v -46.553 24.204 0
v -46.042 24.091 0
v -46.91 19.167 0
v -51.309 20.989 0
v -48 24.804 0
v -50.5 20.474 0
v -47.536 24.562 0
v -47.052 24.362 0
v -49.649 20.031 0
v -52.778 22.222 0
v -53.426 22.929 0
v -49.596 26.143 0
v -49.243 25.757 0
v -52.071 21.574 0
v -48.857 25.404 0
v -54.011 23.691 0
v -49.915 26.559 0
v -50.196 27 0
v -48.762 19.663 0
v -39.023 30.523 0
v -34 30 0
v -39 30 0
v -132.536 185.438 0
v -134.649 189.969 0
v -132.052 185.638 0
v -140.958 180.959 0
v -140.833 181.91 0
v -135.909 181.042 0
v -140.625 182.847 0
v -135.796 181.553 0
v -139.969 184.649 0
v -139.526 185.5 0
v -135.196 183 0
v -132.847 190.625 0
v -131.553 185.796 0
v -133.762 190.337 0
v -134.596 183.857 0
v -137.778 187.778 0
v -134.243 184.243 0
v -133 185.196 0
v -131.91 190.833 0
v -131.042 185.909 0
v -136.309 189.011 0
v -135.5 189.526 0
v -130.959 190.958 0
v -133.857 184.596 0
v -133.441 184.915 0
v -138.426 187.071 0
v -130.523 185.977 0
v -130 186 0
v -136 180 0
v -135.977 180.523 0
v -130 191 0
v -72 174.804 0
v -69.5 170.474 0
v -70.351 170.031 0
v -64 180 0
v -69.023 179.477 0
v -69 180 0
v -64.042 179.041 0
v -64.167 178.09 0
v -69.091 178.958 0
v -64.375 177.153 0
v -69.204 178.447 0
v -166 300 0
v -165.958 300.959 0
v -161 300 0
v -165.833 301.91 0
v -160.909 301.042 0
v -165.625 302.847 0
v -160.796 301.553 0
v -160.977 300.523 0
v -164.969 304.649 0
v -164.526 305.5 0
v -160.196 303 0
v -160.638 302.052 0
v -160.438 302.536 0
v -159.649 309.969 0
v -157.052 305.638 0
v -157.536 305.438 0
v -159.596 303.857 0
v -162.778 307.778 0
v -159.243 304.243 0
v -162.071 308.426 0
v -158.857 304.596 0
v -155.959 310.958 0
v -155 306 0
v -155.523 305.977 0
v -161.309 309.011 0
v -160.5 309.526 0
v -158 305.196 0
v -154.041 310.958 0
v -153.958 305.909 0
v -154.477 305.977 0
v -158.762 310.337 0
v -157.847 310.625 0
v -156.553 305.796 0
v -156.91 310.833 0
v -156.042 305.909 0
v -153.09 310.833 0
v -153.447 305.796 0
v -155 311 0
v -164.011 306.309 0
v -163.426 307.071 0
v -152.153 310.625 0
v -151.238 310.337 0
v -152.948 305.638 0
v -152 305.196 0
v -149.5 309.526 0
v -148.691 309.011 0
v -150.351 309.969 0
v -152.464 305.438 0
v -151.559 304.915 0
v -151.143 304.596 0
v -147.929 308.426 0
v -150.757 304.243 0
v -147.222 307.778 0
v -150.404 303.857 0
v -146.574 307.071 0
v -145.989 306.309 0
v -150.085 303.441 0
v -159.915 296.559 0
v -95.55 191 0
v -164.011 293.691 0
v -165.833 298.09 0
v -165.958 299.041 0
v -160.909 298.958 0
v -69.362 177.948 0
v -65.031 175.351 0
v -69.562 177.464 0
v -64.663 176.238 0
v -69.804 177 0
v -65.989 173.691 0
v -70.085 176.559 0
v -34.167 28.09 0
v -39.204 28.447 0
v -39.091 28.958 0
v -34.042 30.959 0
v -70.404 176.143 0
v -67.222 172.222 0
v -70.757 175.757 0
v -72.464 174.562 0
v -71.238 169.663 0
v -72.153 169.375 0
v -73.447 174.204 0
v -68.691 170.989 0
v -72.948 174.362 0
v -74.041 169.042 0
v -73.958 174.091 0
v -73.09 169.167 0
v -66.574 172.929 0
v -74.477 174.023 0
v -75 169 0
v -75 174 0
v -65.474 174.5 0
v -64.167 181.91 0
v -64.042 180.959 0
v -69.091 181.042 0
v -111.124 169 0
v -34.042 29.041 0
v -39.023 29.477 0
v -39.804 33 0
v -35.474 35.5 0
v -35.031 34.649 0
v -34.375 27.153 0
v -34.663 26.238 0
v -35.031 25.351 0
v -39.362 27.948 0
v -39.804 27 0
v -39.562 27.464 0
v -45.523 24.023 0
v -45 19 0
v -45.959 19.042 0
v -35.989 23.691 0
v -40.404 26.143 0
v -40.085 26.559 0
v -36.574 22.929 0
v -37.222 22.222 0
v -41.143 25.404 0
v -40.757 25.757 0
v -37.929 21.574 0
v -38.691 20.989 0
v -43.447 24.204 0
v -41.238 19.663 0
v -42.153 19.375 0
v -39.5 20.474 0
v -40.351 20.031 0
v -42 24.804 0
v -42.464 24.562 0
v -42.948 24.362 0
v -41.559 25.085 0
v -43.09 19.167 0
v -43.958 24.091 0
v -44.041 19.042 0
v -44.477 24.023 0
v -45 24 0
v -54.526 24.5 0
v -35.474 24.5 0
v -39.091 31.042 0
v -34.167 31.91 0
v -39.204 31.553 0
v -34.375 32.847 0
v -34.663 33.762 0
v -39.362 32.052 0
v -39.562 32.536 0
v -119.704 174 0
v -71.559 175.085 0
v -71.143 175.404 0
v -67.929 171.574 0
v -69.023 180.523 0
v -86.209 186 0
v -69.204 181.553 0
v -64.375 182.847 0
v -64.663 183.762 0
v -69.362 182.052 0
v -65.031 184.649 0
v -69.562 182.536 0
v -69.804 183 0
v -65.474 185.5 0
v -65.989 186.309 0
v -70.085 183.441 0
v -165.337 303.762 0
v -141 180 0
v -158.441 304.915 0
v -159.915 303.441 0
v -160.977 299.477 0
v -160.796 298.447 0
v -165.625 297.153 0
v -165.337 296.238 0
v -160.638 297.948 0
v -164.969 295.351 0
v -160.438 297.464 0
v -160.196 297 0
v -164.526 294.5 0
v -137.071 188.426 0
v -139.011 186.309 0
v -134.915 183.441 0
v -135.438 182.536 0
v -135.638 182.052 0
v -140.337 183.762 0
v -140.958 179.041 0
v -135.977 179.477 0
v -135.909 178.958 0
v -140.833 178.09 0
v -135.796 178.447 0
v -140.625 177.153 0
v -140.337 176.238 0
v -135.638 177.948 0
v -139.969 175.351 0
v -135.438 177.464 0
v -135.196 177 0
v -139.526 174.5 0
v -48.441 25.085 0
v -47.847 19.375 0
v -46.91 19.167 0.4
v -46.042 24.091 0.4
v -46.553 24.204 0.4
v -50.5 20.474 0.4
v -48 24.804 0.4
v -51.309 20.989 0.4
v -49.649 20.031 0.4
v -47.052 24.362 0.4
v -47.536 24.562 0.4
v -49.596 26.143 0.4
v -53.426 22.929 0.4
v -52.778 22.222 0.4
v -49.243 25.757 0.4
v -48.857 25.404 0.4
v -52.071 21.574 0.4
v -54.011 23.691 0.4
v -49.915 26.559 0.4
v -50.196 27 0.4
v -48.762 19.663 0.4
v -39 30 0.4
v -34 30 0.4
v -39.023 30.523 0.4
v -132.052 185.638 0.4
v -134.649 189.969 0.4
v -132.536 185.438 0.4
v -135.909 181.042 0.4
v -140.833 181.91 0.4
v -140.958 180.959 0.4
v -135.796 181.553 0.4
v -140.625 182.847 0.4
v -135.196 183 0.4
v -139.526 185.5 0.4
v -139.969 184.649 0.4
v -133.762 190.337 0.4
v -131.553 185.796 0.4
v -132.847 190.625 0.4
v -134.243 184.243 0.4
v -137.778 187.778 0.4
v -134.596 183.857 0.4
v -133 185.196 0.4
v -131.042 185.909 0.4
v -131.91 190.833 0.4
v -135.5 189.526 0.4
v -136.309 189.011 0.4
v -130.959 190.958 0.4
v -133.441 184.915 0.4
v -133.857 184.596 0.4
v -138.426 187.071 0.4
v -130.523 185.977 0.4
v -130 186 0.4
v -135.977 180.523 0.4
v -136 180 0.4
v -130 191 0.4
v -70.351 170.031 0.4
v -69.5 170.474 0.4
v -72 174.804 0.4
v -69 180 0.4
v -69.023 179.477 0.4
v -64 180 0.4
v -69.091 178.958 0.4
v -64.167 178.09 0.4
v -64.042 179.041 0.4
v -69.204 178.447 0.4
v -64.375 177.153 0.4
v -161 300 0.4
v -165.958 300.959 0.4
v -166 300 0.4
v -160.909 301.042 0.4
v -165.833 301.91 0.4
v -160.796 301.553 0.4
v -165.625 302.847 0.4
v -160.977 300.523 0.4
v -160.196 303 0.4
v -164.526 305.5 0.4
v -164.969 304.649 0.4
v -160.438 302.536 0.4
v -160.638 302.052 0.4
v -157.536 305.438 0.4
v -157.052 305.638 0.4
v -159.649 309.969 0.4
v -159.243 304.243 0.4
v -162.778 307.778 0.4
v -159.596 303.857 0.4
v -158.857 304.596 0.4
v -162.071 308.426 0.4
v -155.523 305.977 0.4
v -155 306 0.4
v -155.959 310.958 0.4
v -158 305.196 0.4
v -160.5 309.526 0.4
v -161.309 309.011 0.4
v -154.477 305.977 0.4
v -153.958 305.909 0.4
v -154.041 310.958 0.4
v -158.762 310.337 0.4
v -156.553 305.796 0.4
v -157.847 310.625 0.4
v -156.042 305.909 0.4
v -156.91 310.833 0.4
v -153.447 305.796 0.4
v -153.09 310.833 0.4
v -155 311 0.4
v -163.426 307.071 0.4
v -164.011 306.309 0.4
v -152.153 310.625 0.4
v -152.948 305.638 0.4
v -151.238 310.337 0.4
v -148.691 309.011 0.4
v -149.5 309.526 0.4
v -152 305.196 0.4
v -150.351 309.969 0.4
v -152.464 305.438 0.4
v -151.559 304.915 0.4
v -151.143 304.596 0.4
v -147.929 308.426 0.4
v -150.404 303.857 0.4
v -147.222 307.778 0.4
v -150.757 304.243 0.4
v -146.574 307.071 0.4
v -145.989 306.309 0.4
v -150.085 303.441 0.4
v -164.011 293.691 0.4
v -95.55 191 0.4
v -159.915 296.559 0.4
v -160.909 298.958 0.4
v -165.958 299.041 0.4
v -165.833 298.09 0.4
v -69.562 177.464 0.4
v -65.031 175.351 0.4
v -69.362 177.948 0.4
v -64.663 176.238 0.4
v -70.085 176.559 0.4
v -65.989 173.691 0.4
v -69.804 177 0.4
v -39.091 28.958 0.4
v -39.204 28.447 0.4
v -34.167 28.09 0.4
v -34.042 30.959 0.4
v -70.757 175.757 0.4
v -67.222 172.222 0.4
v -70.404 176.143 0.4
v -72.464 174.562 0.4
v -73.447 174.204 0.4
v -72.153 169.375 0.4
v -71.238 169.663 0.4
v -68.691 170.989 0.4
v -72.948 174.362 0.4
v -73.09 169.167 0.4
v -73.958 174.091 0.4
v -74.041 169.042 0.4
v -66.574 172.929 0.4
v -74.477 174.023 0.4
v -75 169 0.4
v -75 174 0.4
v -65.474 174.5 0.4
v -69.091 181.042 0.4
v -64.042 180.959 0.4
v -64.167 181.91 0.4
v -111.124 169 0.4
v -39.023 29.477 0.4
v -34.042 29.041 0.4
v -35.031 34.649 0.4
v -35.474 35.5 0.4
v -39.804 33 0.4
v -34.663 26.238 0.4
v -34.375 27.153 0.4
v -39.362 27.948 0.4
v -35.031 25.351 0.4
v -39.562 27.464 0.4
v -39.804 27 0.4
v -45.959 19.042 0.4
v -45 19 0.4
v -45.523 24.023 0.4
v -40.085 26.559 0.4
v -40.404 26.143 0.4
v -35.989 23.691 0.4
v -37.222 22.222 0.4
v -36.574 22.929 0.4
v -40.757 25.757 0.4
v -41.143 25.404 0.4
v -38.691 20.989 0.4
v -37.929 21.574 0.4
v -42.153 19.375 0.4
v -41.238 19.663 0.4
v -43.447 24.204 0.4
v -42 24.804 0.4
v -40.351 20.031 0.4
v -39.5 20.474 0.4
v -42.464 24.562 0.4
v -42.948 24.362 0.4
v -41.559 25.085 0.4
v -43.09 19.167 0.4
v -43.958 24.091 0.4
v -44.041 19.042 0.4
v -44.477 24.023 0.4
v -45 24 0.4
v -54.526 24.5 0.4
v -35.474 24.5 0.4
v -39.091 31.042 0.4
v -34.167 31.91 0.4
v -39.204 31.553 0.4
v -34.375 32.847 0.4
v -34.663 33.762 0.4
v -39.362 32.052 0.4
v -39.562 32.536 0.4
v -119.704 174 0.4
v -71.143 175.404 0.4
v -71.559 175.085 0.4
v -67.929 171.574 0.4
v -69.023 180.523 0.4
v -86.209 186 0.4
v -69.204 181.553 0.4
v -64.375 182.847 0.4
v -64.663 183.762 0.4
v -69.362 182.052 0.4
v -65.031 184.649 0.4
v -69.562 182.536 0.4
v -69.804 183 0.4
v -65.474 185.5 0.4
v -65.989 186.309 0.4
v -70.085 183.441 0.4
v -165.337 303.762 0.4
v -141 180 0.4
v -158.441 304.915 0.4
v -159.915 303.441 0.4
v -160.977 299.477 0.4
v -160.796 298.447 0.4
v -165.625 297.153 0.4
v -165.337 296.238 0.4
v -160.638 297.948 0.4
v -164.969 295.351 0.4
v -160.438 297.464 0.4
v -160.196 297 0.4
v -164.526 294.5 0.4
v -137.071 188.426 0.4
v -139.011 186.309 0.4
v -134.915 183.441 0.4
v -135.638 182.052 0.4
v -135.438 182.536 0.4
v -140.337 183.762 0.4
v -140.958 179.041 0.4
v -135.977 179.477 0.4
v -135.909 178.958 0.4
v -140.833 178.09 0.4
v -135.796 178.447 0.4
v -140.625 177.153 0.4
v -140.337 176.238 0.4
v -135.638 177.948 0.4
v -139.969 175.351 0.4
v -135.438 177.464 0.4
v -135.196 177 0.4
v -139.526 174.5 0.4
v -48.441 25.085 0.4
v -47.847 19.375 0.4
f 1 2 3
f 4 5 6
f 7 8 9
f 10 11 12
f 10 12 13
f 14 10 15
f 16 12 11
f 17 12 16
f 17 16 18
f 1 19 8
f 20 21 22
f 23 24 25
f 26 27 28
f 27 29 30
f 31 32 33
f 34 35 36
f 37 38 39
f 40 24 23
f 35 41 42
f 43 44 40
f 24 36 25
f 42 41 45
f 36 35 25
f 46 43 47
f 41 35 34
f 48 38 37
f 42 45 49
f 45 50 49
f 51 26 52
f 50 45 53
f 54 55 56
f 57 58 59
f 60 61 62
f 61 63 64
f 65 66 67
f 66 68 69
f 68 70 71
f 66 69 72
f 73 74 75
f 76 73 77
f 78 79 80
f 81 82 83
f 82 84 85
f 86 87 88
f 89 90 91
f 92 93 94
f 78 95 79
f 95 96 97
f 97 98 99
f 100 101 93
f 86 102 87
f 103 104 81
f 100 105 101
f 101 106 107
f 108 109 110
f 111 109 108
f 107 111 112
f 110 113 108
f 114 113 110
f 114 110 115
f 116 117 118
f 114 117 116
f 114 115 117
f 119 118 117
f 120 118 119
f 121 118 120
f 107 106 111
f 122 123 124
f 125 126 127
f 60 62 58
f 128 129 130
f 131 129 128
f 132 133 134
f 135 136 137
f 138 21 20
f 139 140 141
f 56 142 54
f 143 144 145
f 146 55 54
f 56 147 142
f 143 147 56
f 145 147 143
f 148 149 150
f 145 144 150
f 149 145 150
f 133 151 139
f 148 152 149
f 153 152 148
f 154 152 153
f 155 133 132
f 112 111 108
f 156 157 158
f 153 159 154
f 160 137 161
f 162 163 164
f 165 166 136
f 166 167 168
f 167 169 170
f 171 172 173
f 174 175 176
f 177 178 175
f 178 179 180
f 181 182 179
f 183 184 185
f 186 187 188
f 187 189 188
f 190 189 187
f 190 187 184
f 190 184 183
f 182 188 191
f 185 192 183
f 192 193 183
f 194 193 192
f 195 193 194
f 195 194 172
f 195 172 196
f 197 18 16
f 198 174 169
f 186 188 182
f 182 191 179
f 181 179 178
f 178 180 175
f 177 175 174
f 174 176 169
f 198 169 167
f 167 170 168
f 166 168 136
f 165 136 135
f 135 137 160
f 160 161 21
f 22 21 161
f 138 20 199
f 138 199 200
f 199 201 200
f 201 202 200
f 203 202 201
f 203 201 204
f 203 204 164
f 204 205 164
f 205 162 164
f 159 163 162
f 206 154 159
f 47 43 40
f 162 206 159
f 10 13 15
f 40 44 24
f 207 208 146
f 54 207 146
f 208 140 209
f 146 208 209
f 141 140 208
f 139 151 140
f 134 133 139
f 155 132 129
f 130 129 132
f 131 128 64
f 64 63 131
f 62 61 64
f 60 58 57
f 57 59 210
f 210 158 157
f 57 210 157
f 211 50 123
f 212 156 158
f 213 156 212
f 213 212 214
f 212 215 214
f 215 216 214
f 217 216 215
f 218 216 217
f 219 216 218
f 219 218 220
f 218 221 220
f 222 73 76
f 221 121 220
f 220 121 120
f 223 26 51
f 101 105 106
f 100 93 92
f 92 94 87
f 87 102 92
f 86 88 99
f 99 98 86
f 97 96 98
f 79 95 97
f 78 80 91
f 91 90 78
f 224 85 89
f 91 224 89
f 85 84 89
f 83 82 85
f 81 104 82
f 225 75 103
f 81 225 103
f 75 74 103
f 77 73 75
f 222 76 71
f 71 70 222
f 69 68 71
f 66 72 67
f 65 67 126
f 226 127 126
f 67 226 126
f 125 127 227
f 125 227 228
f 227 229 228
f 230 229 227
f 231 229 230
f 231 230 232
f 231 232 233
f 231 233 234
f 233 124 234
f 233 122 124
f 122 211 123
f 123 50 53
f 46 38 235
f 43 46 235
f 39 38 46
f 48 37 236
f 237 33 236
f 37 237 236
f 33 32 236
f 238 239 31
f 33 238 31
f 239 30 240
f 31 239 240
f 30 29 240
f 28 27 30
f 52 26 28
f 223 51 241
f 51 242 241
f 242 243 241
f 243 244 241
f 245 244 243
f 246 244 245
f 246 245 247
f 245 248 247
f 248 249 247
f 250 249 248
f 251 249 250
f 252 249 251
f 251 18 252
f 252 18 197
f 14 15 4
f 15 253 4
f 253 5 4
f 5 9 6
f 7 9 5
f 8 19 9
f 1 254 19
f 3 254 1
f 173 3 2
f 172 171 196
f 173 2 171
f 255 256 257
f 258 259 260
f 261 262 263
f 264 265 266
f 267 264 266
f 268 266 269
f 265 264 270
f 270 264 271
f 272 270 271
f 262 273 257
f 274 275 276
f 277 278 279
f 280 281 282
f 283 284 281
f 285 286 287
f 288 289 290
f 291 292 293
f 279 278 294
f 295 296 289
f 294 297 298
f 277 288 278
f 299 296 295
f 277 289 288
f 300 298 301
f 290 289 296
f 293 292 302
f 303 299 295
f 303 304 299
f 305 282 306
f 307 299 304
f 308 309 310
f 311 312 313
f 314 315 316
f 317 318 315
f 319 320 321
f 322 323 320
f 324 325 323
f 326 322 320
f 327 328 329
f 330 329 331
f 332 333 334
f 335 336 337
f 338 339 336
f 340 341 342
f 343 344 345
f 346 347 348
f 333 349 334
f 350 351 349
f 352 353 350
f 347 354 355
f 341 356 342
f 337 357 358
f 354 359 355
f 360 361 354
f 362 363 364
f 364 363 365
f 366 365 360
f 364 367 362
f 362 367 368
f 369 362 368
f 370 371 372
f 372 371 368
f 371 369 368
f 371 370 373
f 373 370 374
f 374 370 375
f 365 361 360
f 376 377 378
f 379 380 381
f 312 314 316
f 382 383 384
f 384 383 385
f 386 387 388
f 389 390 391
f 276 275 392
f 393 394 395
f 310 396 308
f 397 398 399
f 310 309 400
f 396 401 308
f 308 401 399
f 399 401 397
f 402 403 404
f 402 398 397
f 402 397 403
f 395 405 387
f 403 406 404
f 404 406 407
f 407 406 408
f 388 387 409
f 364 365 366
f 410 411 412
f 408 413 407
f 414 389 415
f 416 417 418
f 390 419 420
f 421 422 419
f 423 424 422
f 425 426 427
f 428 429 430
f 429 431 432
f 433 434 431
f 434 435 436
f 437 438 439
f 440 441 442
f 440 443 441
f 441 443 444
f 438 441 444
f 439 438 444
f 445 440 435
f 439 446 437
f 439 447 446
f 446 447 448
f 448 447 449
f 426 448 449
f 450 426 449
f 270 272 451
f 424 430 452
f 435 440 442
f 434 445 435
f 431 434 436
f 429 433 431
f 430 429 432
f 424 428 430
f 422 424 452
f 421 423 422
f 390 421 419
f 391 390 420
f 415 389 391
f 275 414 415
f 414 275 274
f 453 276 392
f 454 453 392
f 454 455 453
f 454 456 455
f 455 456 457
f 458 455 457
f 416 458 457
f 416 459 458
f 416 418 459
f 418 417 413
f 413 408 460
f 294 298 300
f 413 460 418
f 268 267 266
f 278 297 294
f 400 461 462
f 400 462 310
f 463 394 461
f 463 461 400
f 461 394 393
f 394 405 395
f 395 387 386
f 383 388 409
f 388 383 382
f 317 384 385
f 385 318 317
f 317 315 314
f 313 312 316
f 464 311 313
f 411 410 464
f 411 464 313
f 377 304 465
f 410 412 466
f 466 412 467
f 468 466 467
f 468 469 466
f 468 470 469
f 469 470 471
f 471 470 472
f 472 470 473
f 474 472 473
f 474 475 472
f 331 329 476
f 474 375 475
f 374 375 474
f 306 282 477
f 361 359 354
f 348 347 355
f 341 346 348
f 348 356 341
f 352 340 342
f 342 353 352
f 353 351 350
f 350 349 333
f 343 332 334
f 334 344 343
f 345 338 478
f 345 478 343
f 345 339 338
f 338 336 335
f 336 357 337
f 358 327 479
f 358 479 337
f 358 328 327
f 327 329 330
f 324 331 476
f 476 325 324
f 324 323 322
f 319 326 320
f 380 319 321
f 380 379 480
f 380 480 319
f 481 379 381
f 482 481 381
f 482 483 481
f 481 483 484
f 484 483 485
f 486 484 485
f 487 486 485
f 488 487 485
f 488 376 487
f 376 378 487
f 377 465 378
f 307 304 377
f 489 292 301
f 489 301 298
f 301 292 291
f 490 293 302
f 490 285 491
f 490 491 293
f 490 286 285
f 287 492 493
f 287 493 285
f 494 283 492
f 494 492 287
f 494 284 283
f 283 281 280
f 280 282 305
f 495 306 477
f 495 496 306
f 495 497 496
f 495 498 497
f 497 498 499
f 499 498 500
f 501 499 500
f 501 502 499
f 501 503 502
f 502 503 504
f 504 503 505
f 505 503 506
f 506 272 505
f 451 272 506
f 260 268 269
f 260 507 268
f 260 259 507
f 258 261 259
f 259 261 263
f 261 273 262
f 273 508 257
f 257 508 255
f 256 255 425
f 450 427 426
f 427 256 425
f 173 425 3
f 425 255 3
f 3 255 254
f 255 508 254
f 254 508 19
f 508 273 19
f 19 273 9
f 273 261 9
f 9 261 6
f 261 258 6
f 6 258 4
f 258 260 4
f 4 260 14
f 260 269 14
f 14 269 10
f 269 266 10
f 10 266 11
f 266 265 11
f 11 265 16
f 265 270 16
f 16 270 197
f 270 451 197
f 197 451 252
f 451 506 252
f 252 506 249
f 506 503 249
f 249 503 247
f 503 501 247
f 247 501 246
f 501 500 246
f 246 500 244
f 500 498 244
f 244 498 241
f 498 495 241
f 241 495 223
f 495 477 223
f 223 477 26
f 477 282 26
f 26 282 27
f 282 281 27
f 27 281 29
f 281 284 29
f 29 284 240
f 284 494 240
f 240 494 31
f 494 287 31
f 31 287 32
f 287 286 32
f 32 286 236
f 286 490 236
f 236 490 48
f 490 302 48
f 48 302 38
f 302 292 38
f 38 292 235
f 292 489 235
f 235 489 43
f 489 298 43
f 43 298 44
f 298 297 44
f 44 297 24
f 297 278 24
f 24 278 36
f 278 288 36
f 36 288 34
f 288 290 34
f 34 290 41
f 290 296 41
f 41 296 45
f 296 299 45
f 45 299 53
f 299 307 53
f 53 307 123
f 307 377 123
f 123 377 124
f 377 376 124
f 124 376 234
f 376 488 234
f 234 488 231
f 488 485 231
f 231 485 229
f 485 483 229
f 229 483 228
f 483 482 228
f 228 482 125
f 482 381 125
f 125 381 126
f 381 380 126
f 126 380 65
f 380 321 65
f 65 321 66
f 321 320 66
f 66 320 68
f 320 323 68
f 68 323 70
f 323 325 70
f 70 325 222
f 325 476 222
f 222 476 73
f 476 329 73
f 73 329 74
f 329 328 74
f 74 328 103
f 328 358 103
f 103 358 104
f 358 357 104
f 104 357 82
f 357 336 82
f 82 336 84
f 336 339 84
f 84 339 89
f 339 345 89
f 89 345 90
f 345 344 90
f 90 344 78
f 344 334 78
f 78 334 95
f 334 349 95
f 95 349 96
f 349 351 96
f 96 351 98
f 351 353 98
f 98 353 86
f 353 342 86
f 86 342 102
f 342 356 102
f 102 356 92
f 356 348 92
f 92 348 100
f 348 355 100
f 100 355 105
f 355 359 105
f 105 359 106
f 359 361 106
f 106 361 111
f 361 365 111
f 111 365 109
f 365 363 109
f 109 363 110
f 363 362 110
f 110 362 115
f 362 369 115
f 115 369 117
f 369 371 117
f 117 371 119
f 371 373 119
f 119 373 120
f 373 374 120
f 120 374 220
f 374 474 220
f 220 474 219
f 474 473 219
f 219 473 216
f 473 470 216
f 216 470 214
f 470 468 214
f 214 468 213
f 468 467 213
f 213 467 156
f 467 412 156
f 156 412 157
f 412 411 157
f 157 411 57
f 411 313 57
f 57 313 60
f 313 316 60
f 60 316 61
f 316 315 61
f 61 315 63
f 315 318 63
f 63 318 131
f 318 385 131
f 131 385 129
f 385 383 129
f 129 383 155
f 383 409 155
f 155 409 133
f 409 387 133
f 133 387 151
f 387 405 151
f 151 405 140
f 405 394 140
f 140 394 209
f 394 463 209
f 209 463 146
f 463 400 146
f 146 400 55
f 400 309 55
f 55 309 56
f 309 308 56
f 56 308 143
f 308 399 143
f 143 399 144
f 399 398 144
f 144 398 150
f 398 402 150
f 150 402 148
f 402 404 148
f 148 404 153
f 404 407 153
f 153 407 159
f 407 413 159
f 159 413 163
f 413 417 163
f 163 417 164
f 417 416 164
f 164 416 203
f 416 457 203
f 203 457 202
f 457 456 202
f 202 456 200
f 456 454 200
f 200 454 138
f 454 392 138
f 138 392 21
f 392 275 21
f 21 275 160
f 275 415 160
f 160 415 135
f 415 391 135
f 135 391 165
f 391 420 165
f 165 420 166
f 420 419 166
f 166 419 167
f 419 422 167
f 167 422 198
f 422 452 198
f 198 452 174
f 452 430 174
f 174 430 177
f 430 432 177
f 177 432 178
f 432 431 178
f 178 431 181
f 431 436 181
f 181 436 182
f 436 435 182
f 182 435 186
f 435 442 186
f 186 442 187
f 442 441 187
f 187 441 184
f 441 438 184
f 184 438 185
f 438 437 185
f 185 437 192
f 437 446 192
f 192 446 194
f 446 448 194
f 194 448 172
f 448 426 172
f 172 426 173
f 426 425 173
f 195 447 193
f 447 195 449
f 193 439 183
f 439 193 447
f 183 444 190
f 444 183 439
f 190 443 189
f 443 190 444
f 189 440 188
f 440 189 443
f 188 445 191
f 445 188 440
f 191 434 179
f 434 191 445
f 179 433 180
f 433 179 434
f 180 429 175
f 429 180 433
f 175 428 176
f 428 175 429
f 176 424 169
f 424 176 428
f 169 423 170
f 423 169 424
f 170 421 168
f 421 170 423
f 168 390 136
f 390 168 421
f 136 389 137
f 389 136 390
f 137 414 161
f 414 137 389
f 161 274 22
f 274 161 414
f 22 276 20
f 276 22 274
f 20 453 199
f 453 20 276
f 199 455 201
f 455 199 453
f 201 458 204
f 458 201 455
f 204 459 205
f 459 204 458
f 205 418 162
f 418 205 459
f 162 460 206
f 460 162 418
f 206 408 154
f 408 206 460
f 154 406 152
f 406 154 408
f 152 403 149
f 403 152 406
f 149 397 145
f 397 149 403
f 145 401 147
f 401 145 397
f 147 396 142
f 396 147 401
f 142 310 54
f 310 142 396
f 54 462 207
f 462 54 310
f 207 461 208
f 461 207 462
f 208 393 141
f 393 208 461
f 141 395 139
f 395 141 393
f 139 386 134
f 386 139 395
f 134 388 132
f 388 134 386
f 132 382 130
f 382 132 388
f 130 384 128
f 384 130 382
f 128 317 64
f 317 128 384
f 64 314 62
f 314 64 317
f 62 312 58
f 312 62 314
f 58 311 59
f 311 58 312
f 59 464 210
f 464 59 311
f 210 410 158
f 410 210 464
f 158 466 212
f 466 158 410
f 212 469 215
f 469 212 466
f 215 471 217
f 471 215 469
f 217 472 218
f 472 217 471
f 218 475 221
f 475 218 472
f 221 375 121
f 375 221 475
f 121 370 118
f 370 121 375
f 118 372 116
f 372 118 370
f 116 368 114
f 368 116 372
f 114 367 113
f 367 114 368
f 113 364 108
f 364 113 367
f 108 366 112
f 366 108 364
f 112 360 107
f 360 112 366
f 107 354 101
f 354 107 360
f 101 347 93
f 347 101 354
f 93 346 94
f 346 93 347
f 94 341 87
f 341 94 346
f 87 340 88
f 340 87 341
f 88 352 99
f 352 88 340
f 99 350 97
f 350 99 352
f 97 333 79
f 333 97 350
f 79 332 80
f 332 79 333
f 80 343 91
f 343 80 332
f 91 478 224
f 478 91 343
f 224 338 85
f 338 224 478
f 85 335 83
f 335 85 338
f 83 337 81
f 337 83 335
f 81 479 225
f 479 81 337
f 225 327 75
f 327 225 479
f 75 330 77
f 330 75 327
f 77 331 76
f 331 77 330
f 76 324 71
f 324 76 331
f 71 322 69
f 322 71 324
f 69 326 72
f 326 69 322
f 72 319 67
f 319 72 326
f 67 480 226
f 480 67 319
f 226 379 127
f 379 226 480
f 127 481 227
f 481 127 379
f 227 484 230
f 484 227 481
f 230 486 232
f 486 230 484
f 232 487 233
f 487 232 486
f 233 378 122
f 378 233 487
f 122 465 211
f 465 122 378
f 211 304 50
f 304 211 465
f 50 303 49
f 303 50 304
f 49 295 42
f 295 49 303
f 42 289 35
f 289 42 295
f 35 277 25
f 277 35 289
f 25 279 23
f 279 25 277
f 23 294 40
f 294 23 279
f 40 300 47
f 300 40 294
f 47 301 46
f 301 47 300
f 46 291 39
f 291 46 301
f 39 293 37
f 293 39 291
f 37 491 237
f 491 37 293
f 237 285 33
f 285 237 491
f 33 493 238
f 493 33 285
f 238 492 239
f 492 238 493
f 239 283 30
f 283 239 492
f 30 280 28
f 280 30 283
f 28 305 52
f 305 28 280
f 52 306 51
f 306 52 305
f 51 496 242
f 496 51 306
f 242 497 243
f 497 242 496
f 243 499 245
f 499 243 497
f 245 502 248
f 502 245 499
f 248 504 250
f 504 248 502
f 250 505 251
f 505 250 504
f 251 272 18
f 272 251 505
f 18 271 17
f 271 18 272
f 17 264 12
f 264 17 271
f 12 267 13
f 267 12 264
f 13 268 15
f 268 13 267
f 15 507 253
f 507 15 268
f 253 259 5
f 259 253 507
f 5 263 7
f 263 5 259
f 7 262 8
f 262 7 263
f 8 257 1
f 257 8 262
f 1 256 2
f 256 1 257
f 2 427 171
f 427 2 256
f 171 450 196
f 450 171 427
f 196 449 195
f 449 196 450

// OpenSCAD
// file: ../collar.scad
// Calibrated press-fit collar, merged into the rear wall at each pixel.
// The STL is symmetric top/bottom (retention lip at mid-height), so insertion
// direction does not matter. Native STL sits X-centered at collar_cx, Z 0..collar_h.

module collar_solid() {
    translate([-collar_cx, 0, 0])
        import(collar_stl, convexity = 6);
}

module place_collar(x, y) {
    translate([x, y, 0]) collar_solid();
}
// file: ../config.scad
// ===== CHARGE LED sign — global config =====
// Edit this file; then run ./build.sh to regenerate every STL.

$fn = 72;

// ---- bullet pixel datasheet (measured + validated) ----
// dome Ø8, barrel Ø12, flange Ø13.6 x 2mm, dome-tip -> flange 5.5mm.
// Above the plate: ~Ø12 barrel for ~0.5mm, then the Ø8 dome to a tip ~dome_clear
// above the plate front. Drives pixel_through, dome_clear, and led_void clearances.

// ---- calibrated collar (press-fit for 12mm bullet pixel) ----
collar_stl    = "../../assets/bullet-collar.stl"; // path resolved from src/parts/ entry files
collar_h      = 2.0;     // Z span of the collar STL
collar_od     = 16.0;    // collar outer diameter
collar_cx     = 43.0;    // STL native X center (Y center is 0)
pixel_through = 12.3;    // clearance hole through the plate (just over bore Ø12.19)
dome_clear    = 4.0;     // dome protrusion above plate front. Spec: 5.5mm dome-tip-to-flange,
                         // flange seats on plate back, minus 2mm plate ~= 3.5-4mm. Seat a real
                         // pixel and measure to lock it in.

// ---- shell ----
plate_t    = 2.0;        // rear plate thickness (== collar_h, so the collar sits flush)
wall_t     = 2.5;        // chimney wall thickness
cell_inner = 30;         // square interior of each test cell (the press-fit opening)

// ---- diffuser panels (flat, drop-in — kept for the final glued option) ----
panel_press_clear = 0.25; // panel is this much SMALLER than the opening (total) -> friction fit
panel_thicks      = [1, 2, 3];

// ---- diffuser CAP (slides over an ISOLATED chimney; not used on touching rows) ----
cap_fit_clear = 0.4;   // skirt-inner minus chimney-outer (total); bigger = looser slide
cap_skirt_t   = 1.6;   // skirt wall thickness
cap_skirt_h   = 7;     // how far the skirt grips down over the chimney

// ---- diffuser LID = flanged plug (plug locates in the opening, flange catches on the rim) ----
lid_flange_cover = wall_t;  // flange overhang per side ~= wall width (rests on rim, can't fall in)
lid_flange_gap   = 0.3;     // shrink the flange a hair so neighbour lids don't clash
lid_plug_h       = 4;       // how far the plug drops into the opening (0 = plain flat tile)
lid_plug_clear   = 0.2;     // plug-outer = opening minus this (total) -> friction fit
                            // (was 0.5/loose; PETG plug in a PLA hole grips well at 0.2)
lid_plug_wall    = 1.5;     // plug-frame wall thickness

// ---- coupon depth ladder ----
led_gaps = [10, 15, 20]; // clear LED-tip -> diffuser distance, per cell (mm)
                         // (was [20,35,50] — 35/50 went too dim/washed; 20 is the new max)

// ---- collar v2: original bore + lip, plus a 45-deg lead-in chamfer ----
bore_face_r   = 6.10;    // collar bore radius at each face (~Ø12.2)
chamfer_depth = 0.5;     // axial depth of the 45-deg lead-in at each face
mouth_r       = bore_face_r + chamfer_depth;  // chamfer mouth radius (~Ø13.2)

// ---- collar A/B test harness ----
harness_w     = 52;      // tile width
harness_d     = 30;      // tile depth
harness_t     = plate_t; // match the real wall thickness for a faithful fit test
harness_pitch = 24;      // spacing between the two hole centers

// ---- derived ----
cell_pitch = cell_inner + 2 * wall_t;      // outer cell footprint (35)
n_cells    = len(led_gaps);
plate_w    = n_cells * cell_pitch;
plate_d    = cell_pitch;
panel_side = cell_inner - panel_press_clear;
function cell_x(i)     = i * cell_pitch + cell_pitch / 2;   // column center (distance)
function cell_y(j)     = j * cell_pitch + cell_pitch / 2;   // row center (for grid coupons)
function chimney_H(i)  = plate_t + dome_clear + led_gaps[i];
// main file
// V2 WHITE part: white EDGES on the viewer/bed face. filament 1.
include <../config.scad>
include <../collar.scad>
include <../bolt.scad>
bolt_lens_v2_white();
